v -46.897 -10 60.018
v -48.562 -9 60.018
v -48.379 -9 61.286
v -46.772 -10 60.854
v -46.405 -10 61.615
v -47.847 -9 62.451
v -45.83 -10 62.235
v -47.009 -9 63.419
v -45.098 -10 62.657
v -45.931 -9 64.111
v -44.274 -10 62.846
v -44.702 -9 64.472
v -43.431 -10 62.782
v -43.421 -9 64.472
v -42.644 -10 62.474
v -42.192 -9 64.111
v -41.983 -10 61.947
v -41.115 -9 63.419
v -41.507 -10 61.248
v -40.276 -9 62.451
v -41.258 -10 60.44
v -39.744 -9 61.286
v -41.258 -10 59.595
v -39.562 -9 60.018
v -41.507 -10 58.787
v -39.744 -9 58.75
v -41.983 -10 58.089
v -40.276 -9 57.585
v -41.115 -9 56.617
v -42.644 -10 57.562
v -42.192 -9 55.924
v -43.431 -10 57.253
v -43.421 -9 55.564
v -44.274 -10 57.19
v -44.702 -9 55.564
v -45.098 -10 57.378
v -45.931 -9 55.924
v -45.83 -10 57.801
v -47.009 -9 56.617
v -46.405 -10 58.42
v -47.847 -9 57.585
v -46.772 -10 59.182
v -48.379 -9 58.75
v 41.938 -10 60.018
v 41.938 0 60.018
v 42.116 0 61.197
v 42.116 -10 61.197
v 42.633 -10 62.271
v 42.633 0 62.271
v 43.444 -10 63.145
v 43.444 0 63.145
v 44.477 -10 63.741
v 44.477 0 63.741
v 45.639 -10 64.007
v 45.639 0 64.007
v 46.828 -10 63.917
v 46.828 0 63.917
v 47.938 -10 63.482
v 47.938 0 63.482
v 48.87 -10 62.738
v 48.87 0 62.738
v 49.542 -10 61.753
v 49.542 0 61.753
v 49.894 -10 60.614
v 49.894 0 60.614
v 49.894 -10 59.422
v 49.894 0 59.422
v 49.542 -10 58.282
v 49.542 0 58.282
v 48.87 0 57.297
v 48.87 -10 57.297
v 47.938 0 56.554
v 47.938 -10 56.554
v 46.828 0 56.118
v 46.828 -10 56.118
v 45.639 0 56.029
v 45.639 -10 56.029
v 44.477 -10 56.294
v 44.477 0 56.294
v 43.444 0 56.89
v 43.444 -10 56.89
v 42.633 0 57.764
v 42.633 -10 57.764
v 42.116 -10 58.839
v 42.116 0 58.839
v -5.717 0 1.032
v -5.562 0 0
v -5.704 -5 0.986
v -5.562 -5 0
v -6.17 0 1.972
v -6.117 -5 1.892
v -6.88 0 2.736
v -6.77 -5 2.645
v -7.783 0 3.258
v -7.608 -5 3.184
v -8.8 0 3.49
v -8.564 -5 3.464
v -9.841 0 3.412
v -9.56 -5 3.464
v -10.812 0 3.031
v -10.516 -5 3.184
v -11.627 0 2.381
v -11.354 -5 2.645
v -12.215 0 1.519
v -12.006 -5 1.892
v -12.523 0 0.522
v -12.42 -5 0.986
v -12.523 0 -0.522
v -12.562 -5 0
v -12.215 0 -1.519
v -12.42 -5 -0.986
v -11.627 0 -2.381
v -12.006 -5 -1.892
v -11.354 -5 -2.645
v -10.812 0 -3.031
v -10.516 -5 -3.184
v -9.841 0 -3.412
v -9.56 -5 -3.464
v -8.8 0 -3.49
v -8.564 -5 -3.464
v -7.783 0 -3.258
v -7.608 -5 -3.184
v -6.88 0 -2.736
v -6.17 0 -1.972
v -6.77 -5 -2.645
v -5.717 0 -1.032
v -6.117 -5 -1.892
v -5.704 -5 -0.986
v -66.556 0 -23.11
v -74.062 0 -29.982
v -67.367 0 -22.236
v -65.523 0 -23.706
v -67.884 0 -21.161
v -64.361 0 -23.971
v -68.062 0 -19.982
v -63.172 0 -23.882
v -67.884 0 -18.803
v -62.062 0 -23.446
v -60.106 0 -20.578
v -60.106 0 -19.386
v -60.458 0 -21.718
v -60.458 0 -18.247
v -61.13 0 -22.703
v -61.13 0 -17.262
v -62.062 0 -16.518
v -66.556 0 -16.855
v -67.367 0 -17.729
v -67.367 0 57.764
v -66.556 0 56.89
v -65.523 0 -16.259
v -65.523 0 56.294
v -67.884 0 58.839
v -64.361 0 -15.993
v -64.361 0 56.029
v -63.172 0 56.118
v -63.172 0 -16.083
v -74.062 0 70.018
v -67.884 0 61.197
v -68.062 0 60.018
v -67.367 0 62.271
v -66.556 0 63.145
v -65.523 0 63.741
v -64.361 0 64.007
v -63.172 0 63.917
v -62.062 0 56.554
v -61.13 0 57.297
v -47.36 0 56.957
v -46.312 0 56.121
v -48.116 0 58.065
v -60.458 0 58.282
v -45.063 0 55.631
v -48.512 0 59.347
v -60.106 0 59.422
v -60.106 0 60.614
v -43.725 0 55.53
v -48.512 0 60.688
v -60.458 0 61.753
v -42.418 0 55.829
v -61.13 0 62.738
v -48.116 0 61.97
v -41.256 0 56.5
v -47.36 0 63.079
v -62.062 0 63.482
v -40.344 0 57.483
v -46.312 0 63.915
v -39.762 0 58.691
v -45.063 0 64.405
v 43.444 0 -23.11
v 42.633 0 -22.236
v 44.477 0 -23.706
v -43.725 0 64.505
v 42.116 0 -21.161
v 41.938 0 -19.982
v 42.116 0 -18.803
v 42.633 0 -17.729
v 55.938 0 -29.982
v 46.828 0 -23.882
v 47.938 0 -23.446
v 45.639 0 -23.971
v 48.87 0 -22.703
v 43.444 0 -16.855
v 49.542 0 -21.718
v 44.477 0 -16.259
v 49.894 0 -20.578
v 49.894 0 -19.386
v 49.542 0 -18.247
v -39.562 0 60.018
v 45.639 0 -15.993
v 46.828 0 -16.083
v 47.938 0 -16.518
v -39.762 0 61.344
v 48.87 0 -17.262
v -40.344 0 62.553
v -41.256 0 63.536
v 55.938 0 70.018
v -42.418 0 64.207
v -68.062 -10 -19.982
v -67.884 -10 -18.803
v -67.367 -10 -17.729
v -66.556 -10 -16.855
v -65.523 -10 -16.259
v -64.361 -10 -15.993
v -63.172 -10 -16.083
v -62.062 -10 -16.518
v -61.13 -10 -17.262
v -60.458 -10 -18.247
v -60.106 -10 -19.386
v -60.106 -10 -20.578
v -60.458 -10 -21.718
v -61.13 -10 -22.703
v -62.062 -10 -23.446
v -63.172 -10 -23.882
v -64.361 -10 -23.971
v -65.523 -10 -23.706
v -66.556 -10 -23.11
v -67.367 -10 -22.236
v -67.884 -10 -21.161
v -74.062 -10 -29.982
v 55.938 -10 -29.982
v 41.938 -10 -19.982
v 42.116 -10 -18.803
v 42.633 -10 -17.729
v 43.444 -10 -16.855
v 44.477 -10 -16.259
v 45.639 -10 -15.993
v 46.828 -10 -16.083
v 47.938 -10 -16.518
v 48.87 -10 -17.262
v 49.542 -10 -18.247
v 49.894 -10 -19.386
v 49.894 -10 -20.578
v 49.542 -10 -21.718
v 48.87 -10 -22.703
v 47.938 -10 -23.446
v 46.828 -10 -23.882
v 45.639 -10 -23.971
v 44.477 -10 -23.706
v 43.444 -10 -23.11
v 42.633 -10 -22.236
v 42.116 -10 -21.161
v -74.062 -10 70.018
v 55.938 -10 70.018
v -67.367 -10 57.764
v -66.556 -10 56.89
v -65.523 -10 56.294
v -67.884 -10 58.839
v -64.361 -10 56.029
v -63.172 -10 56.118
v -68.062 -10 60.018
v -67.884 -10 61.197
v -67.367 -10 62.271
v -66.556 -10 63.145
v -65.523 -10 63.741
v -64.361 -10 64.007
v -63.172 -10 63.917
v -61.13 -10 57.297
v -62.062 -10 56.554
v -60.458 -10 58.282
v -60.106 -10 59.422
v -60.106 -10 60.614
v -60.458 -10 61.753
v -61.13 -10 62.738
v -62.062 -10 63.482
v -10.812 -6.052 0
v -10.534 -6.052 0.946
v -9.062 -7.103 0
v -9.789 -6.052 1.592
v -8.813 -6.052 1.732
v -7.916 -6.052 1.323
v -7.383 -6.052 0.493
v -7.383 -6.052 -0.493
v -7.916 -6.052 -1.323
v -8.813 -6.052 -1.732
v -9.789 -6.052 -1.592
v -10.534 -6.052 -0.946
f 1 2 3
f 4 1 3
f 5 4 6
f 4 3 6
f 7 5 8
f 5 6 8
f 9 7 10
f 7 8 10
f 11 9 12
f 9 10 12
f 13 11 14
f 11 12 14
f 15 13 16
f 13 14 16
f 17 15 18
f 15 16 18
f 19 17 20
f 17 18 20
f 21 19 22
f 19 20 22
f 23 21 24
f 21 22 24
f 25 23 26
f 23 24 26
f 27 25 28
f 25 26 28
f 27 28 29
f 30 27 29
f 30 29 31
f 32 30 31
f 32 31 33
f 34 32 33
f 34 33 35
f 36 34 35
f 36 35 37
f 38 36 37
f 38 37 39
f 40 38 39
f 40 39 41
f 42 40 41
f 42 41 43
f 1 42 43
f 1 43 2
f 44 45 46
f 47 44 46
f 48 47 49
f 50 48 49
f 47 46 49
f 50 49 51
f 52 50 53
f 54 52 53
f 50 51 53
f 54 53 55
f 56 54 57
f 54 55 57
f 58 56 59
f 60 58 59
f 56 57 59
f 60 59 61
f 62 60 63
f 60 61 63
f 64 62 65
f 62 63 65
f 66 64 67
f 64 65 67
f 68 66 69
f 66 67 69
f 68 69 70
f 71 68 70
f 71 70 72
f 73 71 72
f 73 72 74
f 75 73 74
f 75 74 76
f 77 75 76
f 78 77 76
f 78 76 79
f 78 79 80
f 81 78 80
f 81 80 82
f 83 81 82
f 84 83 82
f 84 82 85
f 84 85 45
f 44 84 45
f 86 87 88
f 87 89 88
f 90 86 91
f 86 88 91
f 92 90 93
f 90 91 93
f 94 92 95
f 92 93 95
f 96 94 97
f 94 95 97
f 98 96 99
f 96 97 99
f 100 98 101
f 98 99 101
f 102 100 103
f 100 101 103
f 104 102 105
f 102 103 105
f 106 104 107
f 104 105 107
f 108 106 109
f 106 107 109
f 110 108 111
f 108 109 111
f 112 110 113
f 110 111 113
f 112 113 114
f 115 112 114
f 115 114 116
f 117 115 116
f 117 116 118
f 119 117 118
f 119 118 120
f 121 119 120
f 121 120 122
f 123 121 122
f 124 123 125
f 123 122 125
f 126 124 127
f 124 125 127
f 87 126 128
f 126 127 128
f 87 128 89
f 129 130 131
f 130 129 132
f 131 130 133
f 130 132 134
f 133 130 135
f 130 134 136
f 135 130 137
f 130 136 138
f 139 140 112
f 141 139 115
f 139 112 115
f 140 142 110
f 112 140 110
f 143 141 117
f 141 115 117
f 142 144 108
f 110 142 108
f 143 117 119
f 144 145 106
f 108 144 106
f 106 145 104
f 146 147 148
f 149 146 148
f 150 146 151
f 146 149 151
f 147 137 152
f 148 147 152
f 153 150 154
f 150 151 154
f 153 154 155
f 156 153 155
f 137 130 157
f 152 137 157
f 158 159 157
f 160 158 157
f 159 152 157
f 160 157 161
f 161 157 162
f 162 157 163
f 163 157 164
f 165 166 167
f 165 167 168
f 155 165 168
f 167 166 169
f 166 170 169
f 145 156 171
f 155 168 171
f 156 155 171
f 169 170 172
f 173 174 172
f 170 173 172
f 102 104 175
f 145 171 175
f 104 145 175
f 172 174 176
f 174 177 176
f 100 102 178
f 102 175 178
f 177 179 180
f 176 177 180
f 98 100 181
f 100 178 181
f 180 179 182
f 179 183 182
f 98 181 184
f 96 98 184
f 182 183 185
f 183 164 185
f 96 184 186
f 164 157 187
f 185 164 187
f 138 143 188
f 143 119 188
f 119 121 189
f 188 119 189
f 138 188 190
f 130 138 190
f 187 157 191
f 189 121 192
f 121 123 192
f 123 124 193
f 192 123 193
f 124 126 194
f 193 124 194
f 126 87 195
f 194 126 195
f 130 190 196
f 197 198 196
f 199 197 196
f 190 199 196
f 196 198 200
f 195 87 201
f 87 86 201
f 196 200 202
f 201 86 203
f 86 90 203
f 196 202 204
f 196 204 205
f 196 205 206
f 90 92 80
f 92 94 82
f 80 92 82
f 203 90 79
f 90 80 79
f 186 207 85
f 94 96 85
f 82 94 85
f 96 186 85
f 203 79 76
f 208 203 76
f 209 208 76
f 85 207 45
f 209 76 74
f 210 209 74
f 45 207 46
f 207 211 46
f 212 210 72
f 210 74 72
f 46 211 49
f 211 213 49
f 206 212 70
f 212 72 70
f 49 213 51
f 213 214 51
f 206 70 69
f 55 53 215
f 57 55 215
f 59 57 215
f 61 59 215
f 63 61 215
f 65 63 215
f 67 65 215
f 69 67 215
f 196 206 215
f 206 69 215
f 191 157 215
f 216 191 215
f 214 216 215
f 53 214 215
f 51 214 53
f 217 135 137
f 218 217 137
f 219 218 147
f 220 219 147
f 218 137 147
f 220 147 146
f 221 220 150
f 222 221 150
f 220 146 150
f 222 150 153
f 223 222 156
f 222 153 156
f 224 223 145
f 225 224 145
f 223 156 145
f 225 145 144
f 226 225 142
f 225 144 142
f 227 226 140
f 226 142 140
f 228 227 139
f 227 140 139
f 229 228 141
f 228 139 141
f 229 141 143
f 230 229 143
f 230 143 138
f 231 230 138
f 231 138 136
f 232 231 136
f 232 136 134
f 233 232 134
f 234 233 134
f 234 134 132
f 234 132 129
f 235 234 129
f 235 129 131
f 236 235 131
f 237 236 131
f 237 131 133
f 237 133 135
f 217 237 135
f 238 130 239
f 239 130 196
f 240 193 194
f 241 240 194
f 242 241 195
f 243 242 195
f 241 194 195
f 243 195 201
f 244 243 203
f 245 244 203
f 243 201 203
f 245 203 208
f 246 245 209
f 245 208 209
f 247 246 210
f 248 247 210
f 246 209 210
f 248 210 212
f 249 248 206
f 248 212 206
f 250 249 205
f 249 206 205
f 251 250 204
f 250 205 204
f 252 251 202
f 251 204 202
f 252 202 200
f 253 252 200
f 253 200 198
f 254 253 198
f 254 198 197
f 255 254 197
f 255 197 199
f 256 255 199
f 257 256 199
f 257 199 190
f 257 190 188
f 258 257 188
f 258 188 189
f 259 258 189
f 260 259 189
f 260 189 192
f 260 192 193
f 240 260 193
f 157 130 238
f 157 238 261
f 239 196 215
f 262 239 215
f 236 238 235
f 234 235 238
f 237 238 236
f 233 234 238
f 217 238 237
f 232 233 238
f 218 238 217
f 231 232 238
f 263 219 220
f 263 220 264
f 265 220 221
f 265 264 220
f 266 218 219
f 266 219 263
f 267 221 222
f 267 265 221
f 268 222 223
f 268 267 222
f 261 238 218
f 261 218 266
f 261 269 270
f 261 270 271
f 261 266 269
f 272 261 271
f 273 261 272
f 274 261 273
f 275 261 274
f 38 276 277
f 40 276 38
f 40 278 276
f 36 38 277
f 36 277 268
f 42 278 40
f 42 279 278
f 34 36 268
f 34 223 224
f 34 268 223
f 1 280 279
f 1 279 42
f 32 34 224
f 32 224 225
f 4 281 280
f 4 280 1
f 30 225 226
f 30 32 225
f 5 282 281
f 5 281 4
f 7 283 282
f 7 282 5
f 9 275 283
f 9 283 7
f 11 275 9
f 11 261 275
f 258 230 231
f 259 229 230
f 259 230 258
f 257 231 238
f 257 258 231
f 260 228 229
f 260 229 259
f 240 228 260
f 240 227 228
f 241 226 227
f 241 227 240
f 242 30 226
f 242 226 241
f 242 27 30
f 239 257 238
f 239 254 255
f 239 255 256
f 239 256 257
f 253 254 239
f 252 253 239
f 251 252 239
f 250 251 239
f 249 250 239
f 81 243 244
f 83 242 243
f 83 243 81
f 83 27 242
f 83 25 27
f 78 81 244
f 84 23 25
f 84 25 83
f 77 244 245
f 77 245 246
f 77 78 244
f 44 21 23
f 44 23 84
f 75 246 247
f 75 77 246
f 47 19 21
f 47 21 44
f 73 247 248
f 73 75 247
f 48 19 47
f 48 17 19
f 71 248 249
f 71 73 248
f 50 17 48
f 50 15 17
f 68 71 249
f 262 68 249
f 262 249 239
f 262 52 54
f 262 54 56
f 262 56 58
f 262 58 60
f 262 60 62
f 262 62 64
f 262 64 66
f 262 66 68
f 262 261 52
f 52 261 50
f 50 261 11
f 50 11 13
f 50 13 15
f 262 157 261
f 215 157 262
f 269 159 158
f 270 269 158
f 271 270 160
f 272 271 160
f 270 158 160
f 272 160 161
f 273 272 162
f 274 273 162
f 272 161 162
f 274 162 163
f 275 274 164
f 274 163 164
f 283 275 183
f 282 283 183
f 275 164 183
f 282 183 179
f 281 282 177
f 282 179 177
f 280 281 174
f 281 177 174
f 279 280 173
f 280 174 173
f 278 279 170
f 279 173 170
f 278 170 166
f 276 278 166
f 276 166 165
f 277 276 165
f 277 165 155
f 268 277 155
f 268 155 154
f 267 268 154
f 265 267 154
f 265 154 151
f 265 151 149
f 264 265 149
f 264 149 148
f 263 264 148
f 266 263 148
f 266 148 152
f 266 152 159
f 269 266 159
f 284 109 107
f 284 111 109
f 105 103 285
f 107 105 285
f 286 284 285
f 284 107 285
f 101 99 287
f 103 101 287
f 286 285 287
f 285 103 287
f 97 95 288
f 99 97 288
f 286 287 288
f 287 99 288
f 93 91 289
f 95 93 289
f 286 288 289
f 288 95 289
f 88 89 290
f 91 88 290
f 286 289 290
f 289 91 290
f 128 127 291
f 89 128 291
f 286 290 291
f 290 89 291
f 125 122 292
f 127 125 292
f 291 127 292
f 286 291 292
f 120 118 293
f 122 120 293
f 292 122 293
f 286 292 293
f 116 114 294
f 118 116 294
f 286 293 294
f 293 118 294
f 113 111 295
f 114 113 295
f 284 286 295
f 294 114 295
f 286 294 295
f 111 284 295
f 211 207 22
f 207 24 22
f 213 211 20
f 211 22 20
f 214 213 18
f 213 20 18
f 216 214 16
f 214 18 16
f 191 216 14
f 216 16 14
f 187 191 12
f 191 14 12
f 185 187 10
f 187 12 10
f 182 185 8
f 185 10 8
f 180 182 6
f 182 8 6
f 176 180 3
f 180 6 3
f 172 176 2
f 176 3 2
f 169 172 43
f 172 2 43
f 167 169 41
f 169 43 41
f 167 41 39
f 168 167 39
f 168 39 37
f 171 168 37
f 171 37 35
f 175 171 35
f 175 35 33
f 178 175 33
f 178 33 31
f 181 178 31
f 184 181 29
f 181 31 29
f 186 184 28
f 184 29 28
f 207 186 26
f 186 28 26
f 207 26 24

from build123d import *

# Parameters (mm, degrees)
F0_W     = 130
F0_H     = 100
F1_DEPTH = 10
F3_D     = 9
F3_DEPTH = 9
F3_TIP   = 2.7038727856
F2_R     = 4
F4_DEPTH = 25
F5_DEPTH = 25
F6_DEPTH = 25
F7_DEPTH = 25
F8_D     = 7
F8_DEPTH = 5
F8_TIP   = 2.1030121666


with BuildPart() as f1:
    # F0 (on Front) → F1 (new body)
    with BuildSketch(Plane.XZ):
        with Locations((-9.0617658345, 20.0177619606)):
            Rectangle(F0_W, F0_H)
    extrude(amount=F1_DEPTH)

    # F3
    with Locations(Plane(origin=(0, 0, 0), x_dir=(-1, 0, 0), z_dir=(0, 1, 0))):
        with Locations((44.0617658345, 60.0177619606)):
            Hole(F3_D / 2, depth=F3_DEPTH)
            with Locations((0, 0, -(F3_DEPTH + F3_TIP / 2))):  # 118° drill point
                Cone(0, F3_D / 2, F3_TIP, mode=Mode.SUBTRACT)

    # F2 (on face) → F4 (cut)
    with BuildSketch(Plane(origin=(0, 0, 0), x_dir=(-1, 0, 0), z_dir=(0, 1, 0))):
        with Locations((-45.9382341655, -19.9822380394)):
            Circle(F2_R)
    extrude(amount=-F4_DEPTH, mode=Mode.SUBTRACT)

    # F2 (on face) → F5 (cut)
    with BuildSketch(Plane(origin=(0, 0, 0), x_dir=(-1, 0, 0), z_dir=(0, 1, 0))):
        with Locations((64.0617658345, -19.9822380394)):
            Circle(F2_R)
    extrude(amount=-F5_DEPTH, mode=Mode.SUBTRACT)

    # F2 (on face) → F6 (cut)
    with BuildSketch(Plane(origin=(0, 0, 0), x_dir=(-1, 0, 0), z_dir=(0, 1, 0))):
        with Locations((64.0617658345, 60.0177619606)):
            Circle(F2_R)
    extrude(amount=-F6_DEPTH, mode=Mode.SUBTRACT)

    # F2 (on face) → F7 (cut)
    with BuildSketch(Plane(origin=(0, 0, 0), x_dir=(-1, 0, 0), z_dir=(0, 1, 0))):
        with Locations((-45.9382341655, 60.0177619606)):
            Circle(F2_R)
    extrude(amount=-F7_DEPTH, mode=Mode.SUBTRACT)

    # F8
    with Locations(Plane(origin=(0, 0, 0), x_dir=(-1, 0, 0), z_dir=(0, 1, 0))):
        with Locations((9.0617658345, 0)):
            Hole(F8_D / 2, depth=F8_DEPTH)
            with Locations((0, 0, -(F8_DEPTH + F8_TIP / 2))):  # 118° drill point
                Cone(0, F8_D / 2, F8_TIP, mode=Mode.SUBTRACT)


solid = f1.part
